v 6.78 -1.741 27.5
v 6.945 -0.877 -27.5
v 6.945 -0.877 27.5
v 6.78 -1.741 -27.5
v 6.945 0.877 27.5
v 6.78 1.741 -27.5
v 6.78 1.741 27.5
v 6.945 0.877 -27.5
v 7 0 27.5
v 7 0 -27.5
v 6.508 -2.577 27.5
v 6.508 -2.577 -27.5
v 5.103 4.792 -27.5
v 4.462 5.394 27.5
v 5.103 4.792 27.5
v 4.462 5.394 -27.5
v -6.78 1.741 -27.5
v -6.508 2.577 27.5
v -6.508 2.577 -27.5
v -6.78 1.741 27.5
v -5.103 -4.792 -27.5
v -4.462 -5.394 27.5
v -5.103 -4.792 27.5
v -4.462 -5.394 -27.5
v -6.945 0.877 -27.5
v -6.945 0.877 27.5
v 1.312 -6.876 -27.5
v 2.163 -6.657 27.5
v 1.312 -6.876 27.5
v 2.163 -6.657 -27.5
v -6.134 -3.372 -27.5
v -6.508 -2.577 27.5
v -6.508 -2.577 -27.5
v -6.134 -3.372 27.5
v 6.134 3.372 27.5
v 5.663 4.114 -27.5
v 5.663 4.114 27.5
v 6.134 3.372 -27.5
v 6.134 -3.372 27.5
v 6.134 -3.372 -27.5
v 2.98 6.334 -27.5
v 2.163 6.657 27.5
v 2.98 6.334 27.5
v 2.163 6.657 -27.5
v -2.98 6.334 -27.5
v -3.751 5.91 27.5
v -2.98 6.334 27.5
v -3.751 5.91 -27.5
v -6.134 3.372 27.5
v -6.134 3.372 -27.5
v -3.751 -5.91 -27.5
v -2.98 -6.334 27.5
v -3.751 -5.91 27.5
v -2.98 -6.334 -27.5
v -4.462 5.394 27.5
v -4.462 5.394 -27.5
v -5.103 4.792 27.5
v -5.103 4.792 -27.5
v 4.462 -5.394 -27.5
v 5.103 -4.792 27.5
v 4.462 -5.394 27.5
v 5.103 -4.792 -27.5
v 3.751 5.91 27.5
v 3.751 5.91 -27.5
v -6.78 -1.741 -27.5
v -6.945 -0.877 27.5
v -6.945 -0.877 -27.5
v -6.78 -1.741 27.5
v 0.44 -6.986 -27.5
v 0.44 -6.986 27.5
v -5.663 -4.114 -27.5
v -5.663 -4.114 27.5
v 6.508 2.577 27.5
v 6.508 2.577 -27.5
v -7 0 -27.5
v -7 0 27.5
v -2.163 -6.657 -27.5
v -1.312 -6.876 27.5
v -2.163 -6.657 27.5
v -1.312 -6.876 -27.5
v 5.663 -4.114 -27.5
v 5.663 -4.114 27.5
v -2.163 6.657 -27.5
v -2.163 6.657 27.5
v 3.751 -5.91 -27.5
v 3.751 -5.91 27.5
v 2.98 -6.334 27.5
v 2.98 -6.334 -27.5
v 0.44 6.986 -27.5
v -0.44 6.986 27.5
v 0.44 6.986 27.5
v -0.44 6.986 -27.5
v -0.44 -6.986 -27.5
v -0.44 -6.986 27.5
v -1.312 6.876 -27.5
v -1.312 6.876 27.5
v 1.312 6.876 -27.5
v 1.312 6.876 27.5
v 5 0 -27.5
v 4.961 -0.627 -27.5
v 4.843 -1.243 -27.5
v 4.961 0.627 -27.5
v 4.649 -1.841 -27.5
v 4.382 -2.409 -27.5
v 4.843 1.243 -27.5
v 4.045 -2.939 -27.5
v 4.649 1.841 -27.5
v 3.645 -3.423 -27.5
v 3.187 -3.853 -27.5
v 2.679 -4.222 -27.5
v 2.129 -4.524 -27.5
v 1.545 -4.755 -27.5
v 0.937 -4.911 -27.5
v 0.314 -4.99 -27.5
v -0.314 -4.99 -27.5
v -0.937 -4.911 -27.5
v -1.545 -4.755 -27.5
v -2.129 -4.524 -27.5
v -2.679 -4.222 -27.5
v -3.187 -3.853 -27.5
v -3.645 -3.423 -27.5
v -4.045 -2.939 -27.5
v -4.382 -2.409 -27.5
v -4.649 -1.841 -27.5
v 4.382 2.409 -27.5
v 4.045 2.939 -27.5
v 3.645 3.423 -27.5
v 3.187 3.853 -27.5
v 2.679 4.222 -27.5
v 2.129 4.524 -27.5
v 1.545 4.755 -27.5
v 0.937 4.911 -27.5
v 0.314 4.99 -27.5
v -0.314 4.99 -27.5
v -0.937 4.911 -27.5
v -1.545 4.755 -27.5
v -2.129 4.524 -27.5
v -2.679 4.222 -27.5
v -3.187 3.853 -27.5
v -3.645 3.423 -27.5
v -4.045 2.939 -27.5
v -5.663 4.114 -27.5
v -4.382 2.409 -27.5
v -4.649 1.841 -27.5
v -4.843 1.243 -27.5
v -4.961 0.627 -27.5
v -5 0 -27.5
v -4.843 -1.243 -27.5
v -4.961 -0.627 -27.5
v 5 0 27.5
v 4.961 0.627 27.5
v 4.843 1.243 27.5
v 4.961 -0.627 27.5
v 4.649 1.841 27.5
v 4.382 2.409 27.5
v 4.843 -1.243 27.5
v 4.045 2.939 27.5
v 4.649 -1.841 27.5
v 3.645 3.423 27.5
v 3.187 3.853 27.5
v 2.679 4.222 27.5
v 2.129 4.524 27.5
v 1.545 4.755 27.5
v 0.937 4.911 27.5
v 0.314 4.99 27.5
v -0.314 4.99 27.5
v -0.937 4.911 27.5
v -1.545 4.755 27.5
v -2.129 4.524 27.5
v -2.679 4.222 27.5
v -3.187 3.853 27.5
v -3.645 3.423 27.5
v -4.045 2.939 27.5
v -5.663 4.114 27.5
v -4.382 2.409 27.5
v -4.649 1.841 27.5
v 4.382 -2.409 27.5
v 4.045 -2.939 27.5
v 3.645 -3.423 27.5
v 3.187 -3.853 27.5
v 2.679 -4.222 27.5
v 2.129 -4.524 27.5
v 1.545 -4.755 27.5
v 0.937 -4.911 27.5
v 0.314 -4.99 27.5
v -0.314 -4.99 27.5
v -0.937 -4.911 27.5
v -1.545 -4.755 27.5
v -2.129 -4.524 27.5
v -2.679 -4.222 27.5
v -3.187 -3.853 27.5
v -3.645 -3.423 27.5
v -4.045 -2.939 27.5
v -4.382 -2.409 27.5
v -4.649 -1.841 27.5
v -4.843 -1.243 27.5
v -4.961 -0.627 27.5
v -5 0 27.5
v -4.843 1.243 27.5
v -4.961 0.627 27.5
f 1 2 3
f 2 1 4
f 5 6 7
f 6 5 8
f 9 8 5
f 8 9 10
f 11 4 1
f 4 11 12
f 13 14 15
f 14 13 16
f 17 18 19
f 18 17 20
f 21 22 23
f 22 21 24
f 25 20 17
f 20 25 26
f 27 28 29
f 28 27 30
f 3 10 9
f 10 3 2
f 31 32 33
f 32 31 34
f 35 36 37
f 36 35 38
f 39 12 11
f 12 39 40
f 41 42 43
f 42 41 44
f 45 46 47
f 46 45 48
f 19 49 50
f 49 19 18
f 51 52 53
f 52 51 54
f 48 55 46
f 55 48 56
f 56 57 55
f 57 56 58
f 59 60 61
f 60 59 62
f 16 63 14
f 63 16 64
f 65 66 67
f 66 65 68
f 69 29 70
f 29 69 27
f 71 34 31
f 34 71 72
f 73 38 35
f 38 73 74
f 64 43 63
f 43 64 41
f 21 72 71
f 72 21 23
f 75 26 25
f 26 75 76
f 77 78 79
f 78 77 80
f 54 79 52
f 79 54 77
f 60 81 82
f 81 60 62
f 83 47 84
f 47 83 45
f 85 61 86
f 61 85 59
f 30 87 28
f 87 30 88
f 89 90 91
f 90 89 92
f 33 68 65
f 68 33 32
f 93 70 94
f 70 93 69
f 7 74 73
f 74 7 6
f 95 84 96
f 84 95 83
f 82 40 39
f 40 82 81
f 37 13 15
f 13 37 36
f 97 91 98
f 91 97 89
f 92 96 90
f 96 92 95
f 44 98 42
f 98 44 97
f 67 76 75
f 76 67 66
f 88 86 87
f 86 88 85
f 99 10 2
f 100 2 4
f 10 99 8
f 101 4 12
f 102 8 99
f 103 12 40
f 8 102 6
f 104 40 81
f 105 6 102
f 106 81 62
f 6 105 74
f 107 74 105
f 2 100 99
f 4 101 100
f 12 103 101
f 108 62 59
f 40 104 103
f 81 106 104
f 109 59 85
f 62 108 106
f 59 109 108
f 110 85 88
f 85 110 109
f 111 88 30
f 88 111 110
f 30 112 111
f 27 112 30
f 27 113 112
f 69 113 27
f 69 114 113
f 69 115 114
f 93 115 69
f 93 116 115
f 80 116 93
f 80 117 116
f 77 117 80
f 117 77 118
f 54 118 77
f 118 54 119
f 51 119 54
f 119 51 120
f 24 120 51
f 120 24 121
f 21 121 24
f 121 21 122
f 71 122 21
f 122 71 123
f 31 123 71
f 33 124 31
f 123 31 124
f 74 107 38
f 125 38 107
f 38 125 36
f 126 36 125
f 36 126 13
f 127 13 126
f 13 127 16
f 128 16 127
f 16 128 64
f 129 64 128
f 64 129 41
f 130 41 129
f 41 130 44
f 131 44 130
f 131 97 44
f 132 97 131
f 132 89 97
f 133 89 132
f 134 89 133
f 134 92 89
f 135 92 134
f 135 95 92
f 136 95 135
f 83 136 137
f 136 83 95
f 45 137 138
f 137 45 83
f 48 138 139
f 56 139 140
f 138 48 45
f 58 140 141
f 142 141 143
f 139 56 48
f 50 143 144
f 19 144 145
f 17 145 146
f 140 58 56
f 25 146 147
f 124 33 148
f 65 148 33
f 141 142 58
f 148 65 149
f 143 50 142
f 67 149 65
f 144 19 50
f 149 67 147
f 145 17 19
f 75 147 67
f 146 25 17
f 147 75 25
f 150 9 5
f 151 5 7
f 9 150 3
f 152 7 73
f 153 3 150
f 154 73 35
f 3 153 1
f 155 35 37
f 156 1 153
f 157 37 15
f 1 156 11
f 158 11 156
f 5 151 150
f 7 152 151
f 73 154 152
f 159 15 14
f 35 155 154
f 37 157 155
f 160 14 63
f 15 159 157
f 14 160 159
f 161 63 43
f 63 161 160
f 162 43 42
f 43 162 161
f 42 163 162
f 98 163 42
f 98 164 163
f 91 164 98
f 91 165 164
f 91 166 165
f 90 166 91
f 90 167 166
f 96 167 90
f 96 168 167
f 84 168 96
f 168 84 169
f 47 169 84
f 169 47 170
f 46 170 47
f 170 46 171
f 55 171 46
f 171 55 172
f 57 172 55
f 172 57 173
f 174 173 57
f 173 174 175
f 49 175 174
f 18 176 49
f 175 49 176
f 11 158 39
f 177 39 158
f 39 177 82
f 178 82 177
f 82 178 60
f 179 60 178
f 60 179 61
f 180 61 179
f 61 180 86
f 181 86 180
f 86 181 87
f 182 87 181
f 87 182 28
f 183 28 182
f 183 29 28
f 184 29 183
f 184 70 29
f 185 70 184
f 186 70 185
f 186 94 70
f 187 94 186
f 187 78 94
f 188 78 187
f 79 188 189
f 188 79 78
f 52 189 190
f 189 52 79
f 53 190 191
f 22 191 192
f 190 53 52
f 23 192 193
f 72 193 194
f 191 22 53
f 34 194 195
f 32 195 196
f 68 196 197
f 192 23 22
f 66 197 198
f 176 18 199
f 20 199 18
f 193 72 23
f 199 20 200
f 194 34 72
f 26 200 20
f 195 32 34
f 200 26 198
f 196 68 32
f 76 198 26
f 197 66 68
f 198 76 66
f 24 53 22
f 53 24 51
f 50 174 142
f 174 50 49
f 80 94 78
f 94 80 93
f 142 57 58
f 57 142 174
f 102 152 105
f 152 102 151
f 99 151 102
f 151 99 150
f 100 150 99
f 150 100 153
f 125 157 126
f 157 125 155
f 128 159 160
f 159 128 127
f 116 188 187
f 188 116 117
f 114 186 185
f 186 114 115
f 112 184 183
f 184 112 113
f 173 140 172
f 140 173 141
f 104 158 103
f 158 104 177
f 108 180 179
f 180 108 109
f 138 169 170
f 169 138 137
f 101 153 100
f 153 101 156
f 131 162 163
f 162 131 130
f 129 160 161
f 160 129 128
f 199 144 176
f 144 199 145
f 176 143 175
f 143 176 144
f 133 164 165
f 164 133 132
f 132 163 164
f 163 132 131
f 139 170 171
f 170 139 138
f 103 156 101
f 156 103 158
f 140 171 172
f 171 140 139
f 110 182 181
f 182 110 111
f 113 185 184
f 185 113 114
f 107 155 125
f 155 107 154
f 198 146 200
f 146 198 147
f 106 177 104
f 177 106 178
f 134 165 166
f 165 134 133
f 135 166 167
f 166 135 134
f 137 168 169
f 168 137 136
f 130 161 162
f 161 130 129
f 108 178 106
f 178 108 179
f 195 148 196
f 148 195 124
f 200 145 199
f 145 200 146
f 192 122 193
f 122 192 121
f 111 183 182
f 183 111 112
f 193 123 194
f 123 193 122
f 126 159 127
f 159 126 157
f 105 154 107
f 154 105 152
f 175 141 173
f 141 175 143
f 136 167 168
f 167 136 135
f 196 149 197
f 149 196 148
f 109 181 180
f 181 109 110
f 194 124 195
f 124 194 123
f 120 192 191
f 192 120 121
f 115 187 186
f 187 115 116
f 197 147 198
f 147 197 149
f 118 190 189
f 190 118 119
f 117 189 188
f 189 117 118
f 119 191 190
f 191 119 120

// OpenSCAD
$fn = 50;


difference() {
	union() {
		translate(v = [0, 0, -27.5000000000]) {
			cylinder(h = 55, r = 7.0000000000);
		}
	}
	union() {
		translate(v = [0, 0, -100.0000000000]) {
			cylinder(h = 200, r = 5.0000000000);
		}
	}
}
